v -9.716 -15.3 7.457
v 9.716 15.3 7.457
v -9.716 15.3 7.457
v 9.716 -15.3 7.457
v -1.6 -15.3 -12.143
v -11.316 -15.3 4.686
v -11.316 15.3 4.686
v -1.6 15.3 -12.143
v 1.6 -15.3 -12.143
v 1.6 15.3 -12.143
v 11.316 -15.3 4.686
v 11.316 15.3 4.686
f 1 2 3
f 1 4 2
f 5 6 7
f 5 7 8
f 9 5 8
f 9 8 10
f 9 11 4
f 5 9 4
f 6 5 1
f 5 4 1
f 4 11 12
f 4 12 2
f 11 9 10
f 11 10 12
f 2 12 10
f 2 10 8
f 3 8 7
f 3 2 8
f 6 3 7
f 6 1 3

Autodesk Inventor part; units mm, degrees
ref_plane "YZ Plane" through (0, 0, 0) normal (1, 0, 0) x (0, 1, 0)
ref_plane "XZ Plane" through (0, 0, 0) normal (0, 1, 0) x (-1, 0, 0)
ref_plane "XY Plane" through (0, 0, 0) normal (0, 0, 1) x (1, 0, 0)
sketch "Sketch1" plane through (0, 0, 0) normal (0, 1, 0) x (-1, 0, 0)
  line L0 (1.6, -12.1429) -> (-1.6, -12.1429)
  line L1 (-1.6, -12.1429) -> (-11.3161, 4.6858)
  line L2 (-11.3161, 4.6858) -> (-9.7161, 7.4571)
  line L3 (-9.7161, 7.4571) -> (9.7161, 7.4571)
  line L4 (9.7161, 7.4571) -> (11.3161, 4.6858)
  line L5 (11.3161, 4.6858) -> (1.6, -12.1429)
  circle A0 centre (0, 0) radius 7.4571 construction
  dimension "d0" = 19.6
  dimension "d1" = 3.2
  dimension "d4" = 14.9142
extrude "Extrusion1" add sketch "Sketch1" along normal mid plane 30.6
properties part number "FactionSpecial_Council_CommandToken" material "ABS Plastic"
